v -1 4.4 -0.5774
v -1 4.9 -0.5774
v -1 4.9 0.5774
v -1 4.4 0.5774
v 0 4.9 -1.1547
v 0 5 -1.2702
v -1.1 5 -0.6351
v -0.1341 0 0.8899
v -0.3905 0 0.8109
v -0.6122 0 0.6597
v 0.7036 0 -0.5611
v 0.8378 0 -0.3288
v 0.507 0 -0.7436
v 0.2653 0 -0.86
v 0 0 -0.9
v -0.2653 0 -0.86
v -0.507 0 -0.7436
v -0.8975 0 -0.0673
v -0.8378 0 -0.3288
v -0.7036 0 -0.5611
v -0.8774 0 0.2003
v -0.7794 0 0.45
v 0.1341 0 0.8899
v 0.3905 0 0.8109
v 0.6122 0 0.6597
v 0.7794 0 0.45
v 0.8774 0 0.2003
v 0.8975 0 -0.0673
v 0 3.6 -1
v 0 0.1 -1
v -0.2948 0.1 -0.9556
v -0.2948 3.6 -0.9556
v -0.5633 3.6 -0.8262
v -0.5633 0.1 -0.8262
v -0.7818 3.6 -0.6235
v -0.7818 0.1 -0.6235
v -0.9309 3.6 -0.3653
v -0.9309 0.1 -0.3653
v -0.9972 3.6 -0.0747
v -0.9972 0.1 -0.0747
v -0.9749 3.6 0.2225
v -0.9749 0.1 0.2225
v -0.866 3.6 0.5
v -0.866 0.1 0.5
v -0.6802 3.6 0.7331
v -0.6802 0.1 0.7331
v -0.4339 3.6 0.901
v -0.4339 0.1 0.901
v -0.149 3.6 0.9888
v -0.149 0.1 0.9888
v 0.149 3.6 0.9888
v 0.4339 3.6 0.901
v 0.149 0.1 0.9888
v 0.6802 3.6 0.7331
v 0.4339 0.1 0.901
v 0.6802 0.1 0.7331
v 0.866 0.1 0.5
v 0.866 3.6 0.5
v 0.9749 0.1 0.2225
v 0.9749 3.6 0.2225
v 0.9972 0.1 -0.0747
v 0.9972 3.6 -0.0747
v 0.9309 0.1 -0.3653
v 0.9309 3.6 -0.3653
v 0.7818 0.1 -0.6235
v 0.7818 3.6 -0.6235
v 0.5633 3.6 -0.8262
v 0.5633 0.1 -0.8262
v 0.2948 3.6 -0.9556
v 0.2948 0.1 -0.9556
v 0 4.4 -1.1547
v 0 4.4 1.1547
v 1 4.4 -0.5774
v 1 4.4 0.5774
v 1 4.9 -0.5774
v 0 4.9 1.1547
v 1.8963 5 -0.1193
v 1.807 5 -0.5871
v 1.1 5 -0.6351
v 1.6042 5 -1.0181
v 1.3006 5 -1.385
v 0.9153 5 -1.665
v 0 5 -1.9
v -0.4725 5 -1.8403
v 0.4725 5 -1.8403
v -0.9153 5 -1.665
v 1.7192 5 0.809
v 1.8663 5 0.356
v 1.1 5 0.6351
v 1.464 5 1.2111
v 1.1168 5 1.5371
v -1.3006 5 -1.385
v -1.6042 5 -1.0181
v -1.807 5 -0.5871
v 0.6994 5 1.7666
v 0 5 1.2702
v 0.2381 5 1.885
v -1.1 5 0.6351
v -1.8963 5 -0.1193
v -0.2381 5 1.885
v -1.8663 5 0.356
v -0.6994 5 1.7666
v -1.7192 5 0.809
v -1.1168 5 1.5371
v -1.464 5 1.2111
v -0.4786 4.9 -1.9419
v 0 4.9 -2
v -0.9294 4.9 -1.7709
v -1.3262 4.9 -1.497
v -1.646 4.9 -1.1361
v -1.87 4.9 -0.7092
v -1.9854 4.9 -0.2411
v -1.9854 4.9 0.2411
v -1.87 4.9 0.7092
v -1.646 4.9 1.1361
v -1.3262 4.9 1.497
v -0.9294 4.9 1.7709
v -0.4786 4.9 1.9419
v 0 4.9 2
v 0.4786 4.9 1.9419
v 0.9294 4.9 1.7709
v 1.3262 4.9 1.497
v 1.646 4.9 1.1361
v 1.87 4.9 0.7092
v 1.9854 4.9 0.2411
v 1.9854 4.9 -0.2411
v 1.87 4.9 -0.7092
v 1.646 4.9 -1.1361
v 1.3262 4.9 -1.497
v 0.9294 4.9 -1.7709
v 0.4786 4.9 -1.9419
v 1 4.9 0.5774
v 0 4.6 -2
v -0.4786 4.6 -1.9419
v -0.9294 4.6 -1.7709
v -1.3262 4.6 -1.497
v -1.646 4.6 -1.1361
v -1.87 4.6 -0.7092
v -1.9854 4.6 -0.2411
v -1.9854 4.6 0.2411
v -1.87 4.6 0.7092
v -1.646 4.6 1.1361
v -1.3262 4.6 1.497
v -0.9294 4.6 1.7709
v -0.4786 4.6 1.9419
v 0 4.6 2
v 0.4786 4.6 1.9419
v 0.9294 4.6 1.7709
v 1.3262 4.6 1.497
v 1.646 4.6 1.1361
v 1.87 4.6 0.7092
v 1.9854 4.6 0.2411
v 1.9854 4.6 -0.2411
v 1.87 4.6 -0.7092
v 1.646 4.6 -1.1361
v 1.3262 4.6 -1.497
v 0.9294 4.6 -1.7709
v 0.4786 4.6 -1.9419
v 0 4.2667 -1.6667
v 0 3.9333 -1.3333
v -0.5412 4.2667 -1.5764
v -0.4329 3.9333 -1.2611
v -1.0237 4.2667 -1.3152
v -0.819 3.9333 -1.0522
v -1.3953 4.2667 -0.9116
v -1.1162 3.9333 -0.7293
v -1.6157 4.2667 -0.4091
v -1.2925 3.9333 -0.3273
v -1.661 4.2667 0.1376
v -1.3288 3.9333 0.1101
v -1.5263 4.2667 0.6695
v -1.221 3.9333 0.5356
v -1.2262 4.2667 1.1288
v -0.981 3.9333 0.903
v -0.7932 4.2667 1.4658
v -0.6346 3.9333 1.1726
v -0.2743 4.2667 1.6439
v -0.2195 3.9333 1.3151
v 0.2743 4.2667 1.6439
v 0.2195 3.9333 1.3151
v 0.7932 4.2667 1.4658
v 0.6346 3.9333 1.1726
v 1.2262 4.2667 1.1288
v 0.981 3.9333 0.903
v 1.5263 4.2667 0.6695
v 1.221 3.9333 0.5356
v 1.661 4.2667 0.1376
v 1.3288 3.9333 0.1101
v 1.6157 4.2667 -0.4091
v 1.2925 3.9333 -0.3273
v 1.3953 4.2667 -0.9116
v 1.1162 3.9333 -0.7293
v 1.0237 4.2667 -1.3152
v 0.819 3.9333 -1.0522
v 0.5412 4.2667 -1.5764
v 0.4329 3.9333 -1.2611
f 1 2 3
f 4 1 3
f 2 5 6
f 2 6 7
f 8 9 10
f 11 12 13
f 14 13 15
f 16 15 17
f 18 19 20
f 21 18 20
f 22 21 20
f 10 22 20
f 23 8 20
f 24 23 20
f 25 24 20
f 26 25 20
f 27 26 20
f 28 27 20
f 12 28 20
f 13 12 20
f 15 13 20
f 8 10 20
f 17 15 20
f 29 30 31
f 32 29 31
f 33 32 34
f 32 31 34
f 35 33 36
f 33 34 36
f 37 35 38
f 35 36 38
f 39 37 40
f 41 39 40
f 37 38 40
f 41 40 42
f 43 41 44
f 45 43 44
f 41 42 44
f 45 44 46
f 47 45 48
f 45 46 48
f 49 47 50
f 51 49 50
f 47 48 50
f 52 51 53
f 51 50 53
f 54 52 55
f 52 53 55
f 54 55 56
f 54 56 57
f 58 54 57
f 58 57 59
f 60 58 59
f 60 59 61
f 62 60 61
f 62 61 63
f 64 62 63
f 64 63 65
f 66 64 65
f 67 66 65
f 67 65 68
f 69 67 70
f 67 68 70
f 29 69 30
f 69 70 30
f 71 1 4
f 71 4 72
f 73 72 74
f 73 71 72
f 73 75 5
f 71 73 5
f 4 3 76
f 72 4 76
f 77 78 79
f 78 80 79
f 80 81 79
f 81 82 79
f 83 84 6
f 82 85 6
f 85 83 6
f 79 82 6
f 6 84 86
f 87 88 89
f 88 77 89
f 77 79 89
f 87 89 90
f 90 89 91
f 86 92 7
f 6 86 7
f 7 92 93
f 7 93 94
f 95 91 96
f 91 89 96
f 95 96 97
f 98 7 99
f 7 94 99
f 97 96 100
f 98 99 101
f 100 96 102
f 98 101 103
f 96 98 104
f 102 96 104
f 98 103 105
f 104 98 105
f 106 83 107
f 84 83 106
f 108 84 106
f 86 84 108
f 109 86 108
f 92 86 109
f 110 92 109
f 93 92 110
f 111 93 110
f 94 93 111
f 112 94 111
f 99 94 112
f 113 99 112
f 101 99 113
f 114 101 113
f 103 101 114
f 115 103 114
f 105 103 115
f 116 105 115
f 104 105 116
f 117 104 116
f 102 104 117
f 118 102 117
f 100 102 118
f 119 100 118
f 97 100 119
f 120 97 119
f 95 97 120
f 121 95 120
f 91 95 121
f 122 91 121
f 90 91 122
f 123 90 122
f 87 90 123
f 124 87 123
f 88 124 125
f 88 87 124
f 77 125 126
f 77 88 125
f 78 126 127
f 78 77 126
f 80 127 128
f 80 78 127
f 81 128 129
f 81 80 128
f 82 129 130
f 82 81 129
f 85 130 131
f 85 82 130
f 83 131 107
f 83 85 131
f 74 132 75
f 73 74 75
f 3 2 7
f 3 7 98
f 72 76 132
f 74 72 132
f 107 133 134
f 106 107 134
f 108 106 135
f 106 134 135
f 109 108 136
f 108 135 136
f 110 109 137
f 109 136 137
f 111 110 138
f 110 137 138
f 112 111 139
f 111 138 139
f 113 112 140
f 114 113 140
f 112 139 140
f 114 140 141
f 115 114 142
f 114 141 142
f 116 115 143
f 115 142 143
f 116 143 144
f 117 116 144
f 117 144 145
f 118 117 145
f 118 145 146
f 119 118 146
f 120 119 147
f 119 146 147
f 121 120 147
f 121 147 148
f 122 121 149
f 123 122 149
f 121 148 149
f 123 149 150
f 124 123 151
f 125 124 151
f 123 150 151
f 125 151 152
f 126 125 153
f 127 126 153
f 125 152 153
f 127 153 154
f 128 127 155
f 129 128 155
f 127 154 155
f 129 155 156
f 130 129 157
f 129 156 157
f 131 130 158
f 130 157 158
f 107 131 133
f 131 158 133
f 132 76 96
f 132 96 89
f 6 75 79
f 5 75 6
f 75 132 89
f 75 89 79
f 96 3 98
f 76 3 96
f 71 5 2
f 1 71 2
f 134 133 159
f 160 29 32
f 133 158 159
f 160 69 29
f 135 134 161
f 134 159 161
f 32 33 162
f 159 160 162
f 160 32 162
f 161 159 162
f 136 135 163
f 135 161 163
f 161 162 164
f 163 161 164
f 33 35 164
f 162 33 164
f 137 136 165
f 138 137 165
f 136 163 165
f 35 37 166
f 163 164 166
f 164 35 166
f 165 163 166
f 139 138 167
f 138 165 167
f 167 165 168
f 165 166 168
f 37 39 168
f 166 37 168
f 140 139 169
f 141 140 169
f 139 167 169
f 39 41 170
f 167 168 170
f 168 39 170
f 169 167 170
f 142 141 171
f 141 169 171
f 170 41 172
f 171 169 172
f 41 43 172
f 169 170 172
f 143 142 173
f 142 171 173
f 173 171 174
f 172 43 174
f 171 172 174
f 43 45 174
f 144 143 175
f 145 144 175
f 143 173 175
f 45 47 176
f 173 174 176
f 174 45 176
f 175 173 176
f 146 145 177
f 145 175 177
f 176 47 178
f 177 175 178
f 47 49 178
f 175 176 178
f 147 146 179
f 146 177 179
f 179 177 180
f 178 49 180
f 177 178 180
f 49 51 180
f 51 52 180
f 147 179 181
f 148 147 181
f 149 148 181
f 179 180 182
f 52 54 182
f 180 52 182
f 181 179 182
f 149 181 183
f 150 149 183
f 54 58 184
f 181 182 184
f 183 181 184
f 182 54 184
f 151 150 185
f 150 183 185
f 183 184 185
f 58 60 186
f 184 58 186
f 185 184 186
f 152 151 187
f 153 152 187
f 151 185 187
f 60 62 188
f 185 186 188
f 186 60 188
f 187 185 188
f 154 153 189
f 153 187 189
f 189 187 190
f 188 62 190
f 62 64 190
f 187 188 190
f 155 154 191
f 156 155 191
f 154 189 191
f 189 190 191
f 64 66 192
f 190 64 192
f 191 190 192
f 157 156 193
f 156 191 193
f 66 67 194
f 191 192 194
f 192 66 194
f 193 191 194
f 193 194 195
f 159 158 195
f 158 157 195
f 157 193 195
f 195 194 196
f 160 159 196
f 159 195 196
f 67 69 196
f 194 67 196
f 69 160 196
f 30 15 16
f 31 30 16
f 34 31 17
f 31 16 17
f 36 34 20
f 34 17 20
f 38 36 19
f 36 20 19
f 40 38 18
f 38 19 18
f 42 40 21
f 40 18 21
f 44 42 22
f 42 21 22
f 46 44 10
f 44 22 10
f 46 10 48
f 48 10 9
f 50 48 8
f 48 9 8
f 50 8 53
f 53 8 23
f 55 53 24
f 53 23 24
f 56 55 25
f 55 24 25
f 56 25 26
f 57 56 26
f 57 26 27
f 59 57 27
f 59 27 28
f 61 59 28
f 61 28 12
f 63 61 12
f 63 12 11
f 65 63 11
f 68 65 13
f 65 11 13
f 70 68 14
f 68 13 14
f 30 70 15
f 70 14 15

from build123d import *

# Parameters (mm, degrees)
CUT_EXTRUDE1_DEPTH = 0.6
CHAMFER1_SIZE      = 0.1
CHAMFER2_SIZE      = 0.1


with BuildPart() as part:
    # Sketch1 → Revolve1 (revolve)
    with BuildSketch(Plane(origin=(0, 0, 0), x_dir=(0, 0, -1), z_dir=(1, 0, 0)), mode=Mode.PRIVATE) as revolve1_sk:
        Polygon((0, 5), (-2, 5), (-2, 4.6), (-1, 3.6), (-1, 0), (0, 0), align=None)
    revolve(revolve1_sk.sketch.rotate(Axis((0, 0, 0), (0, 1, 0)), 180), axis=Axis((0, 0, 0), (0, 1, 0)))

    # Sketch2 → Cut-Extrude1 (cut)
    with BuildSketch(Plane(origin=(0, 5, 0), x_dir=(1, 0, 0), z_dir=(0, 1, 0))):
        Polygon((0, -1.154700538), (1, -0.577350269), (1, 0.577350269), (0, 1.154700538), (-1, 0.577350269), (-1, -0.577350269), align=None)
    extrude(amount=-CUT_EXTRUDE1_DEPTH, mode=Mode.SUBTRACT)

    # Chamfer1
    chamfer1_edges = [part.edges().sort_by_distance(p)[0] for p in [
        (0, 0, 1),
    ]]
    chamfer(chamfer1_edges, length=CHAMFER1_SIZE)

    # Chamfer2
    chamfer2_edges = [part.edges().sort_by_distance(p)[0] for p in [
        (-0.5, 5, 0.866025404),
        (0.5, 5, 0.866025404),
        (1, 5, 0),
        (0.5, 5, -0.866025404),
        (-0.5, 5, -0.866025404),
        (-1, 5, 0),
        (0, 5, 2),
    ]]
    chamfer(chamfer2_edges, length=CHAMFER2_SIZE)


solid = part.part
